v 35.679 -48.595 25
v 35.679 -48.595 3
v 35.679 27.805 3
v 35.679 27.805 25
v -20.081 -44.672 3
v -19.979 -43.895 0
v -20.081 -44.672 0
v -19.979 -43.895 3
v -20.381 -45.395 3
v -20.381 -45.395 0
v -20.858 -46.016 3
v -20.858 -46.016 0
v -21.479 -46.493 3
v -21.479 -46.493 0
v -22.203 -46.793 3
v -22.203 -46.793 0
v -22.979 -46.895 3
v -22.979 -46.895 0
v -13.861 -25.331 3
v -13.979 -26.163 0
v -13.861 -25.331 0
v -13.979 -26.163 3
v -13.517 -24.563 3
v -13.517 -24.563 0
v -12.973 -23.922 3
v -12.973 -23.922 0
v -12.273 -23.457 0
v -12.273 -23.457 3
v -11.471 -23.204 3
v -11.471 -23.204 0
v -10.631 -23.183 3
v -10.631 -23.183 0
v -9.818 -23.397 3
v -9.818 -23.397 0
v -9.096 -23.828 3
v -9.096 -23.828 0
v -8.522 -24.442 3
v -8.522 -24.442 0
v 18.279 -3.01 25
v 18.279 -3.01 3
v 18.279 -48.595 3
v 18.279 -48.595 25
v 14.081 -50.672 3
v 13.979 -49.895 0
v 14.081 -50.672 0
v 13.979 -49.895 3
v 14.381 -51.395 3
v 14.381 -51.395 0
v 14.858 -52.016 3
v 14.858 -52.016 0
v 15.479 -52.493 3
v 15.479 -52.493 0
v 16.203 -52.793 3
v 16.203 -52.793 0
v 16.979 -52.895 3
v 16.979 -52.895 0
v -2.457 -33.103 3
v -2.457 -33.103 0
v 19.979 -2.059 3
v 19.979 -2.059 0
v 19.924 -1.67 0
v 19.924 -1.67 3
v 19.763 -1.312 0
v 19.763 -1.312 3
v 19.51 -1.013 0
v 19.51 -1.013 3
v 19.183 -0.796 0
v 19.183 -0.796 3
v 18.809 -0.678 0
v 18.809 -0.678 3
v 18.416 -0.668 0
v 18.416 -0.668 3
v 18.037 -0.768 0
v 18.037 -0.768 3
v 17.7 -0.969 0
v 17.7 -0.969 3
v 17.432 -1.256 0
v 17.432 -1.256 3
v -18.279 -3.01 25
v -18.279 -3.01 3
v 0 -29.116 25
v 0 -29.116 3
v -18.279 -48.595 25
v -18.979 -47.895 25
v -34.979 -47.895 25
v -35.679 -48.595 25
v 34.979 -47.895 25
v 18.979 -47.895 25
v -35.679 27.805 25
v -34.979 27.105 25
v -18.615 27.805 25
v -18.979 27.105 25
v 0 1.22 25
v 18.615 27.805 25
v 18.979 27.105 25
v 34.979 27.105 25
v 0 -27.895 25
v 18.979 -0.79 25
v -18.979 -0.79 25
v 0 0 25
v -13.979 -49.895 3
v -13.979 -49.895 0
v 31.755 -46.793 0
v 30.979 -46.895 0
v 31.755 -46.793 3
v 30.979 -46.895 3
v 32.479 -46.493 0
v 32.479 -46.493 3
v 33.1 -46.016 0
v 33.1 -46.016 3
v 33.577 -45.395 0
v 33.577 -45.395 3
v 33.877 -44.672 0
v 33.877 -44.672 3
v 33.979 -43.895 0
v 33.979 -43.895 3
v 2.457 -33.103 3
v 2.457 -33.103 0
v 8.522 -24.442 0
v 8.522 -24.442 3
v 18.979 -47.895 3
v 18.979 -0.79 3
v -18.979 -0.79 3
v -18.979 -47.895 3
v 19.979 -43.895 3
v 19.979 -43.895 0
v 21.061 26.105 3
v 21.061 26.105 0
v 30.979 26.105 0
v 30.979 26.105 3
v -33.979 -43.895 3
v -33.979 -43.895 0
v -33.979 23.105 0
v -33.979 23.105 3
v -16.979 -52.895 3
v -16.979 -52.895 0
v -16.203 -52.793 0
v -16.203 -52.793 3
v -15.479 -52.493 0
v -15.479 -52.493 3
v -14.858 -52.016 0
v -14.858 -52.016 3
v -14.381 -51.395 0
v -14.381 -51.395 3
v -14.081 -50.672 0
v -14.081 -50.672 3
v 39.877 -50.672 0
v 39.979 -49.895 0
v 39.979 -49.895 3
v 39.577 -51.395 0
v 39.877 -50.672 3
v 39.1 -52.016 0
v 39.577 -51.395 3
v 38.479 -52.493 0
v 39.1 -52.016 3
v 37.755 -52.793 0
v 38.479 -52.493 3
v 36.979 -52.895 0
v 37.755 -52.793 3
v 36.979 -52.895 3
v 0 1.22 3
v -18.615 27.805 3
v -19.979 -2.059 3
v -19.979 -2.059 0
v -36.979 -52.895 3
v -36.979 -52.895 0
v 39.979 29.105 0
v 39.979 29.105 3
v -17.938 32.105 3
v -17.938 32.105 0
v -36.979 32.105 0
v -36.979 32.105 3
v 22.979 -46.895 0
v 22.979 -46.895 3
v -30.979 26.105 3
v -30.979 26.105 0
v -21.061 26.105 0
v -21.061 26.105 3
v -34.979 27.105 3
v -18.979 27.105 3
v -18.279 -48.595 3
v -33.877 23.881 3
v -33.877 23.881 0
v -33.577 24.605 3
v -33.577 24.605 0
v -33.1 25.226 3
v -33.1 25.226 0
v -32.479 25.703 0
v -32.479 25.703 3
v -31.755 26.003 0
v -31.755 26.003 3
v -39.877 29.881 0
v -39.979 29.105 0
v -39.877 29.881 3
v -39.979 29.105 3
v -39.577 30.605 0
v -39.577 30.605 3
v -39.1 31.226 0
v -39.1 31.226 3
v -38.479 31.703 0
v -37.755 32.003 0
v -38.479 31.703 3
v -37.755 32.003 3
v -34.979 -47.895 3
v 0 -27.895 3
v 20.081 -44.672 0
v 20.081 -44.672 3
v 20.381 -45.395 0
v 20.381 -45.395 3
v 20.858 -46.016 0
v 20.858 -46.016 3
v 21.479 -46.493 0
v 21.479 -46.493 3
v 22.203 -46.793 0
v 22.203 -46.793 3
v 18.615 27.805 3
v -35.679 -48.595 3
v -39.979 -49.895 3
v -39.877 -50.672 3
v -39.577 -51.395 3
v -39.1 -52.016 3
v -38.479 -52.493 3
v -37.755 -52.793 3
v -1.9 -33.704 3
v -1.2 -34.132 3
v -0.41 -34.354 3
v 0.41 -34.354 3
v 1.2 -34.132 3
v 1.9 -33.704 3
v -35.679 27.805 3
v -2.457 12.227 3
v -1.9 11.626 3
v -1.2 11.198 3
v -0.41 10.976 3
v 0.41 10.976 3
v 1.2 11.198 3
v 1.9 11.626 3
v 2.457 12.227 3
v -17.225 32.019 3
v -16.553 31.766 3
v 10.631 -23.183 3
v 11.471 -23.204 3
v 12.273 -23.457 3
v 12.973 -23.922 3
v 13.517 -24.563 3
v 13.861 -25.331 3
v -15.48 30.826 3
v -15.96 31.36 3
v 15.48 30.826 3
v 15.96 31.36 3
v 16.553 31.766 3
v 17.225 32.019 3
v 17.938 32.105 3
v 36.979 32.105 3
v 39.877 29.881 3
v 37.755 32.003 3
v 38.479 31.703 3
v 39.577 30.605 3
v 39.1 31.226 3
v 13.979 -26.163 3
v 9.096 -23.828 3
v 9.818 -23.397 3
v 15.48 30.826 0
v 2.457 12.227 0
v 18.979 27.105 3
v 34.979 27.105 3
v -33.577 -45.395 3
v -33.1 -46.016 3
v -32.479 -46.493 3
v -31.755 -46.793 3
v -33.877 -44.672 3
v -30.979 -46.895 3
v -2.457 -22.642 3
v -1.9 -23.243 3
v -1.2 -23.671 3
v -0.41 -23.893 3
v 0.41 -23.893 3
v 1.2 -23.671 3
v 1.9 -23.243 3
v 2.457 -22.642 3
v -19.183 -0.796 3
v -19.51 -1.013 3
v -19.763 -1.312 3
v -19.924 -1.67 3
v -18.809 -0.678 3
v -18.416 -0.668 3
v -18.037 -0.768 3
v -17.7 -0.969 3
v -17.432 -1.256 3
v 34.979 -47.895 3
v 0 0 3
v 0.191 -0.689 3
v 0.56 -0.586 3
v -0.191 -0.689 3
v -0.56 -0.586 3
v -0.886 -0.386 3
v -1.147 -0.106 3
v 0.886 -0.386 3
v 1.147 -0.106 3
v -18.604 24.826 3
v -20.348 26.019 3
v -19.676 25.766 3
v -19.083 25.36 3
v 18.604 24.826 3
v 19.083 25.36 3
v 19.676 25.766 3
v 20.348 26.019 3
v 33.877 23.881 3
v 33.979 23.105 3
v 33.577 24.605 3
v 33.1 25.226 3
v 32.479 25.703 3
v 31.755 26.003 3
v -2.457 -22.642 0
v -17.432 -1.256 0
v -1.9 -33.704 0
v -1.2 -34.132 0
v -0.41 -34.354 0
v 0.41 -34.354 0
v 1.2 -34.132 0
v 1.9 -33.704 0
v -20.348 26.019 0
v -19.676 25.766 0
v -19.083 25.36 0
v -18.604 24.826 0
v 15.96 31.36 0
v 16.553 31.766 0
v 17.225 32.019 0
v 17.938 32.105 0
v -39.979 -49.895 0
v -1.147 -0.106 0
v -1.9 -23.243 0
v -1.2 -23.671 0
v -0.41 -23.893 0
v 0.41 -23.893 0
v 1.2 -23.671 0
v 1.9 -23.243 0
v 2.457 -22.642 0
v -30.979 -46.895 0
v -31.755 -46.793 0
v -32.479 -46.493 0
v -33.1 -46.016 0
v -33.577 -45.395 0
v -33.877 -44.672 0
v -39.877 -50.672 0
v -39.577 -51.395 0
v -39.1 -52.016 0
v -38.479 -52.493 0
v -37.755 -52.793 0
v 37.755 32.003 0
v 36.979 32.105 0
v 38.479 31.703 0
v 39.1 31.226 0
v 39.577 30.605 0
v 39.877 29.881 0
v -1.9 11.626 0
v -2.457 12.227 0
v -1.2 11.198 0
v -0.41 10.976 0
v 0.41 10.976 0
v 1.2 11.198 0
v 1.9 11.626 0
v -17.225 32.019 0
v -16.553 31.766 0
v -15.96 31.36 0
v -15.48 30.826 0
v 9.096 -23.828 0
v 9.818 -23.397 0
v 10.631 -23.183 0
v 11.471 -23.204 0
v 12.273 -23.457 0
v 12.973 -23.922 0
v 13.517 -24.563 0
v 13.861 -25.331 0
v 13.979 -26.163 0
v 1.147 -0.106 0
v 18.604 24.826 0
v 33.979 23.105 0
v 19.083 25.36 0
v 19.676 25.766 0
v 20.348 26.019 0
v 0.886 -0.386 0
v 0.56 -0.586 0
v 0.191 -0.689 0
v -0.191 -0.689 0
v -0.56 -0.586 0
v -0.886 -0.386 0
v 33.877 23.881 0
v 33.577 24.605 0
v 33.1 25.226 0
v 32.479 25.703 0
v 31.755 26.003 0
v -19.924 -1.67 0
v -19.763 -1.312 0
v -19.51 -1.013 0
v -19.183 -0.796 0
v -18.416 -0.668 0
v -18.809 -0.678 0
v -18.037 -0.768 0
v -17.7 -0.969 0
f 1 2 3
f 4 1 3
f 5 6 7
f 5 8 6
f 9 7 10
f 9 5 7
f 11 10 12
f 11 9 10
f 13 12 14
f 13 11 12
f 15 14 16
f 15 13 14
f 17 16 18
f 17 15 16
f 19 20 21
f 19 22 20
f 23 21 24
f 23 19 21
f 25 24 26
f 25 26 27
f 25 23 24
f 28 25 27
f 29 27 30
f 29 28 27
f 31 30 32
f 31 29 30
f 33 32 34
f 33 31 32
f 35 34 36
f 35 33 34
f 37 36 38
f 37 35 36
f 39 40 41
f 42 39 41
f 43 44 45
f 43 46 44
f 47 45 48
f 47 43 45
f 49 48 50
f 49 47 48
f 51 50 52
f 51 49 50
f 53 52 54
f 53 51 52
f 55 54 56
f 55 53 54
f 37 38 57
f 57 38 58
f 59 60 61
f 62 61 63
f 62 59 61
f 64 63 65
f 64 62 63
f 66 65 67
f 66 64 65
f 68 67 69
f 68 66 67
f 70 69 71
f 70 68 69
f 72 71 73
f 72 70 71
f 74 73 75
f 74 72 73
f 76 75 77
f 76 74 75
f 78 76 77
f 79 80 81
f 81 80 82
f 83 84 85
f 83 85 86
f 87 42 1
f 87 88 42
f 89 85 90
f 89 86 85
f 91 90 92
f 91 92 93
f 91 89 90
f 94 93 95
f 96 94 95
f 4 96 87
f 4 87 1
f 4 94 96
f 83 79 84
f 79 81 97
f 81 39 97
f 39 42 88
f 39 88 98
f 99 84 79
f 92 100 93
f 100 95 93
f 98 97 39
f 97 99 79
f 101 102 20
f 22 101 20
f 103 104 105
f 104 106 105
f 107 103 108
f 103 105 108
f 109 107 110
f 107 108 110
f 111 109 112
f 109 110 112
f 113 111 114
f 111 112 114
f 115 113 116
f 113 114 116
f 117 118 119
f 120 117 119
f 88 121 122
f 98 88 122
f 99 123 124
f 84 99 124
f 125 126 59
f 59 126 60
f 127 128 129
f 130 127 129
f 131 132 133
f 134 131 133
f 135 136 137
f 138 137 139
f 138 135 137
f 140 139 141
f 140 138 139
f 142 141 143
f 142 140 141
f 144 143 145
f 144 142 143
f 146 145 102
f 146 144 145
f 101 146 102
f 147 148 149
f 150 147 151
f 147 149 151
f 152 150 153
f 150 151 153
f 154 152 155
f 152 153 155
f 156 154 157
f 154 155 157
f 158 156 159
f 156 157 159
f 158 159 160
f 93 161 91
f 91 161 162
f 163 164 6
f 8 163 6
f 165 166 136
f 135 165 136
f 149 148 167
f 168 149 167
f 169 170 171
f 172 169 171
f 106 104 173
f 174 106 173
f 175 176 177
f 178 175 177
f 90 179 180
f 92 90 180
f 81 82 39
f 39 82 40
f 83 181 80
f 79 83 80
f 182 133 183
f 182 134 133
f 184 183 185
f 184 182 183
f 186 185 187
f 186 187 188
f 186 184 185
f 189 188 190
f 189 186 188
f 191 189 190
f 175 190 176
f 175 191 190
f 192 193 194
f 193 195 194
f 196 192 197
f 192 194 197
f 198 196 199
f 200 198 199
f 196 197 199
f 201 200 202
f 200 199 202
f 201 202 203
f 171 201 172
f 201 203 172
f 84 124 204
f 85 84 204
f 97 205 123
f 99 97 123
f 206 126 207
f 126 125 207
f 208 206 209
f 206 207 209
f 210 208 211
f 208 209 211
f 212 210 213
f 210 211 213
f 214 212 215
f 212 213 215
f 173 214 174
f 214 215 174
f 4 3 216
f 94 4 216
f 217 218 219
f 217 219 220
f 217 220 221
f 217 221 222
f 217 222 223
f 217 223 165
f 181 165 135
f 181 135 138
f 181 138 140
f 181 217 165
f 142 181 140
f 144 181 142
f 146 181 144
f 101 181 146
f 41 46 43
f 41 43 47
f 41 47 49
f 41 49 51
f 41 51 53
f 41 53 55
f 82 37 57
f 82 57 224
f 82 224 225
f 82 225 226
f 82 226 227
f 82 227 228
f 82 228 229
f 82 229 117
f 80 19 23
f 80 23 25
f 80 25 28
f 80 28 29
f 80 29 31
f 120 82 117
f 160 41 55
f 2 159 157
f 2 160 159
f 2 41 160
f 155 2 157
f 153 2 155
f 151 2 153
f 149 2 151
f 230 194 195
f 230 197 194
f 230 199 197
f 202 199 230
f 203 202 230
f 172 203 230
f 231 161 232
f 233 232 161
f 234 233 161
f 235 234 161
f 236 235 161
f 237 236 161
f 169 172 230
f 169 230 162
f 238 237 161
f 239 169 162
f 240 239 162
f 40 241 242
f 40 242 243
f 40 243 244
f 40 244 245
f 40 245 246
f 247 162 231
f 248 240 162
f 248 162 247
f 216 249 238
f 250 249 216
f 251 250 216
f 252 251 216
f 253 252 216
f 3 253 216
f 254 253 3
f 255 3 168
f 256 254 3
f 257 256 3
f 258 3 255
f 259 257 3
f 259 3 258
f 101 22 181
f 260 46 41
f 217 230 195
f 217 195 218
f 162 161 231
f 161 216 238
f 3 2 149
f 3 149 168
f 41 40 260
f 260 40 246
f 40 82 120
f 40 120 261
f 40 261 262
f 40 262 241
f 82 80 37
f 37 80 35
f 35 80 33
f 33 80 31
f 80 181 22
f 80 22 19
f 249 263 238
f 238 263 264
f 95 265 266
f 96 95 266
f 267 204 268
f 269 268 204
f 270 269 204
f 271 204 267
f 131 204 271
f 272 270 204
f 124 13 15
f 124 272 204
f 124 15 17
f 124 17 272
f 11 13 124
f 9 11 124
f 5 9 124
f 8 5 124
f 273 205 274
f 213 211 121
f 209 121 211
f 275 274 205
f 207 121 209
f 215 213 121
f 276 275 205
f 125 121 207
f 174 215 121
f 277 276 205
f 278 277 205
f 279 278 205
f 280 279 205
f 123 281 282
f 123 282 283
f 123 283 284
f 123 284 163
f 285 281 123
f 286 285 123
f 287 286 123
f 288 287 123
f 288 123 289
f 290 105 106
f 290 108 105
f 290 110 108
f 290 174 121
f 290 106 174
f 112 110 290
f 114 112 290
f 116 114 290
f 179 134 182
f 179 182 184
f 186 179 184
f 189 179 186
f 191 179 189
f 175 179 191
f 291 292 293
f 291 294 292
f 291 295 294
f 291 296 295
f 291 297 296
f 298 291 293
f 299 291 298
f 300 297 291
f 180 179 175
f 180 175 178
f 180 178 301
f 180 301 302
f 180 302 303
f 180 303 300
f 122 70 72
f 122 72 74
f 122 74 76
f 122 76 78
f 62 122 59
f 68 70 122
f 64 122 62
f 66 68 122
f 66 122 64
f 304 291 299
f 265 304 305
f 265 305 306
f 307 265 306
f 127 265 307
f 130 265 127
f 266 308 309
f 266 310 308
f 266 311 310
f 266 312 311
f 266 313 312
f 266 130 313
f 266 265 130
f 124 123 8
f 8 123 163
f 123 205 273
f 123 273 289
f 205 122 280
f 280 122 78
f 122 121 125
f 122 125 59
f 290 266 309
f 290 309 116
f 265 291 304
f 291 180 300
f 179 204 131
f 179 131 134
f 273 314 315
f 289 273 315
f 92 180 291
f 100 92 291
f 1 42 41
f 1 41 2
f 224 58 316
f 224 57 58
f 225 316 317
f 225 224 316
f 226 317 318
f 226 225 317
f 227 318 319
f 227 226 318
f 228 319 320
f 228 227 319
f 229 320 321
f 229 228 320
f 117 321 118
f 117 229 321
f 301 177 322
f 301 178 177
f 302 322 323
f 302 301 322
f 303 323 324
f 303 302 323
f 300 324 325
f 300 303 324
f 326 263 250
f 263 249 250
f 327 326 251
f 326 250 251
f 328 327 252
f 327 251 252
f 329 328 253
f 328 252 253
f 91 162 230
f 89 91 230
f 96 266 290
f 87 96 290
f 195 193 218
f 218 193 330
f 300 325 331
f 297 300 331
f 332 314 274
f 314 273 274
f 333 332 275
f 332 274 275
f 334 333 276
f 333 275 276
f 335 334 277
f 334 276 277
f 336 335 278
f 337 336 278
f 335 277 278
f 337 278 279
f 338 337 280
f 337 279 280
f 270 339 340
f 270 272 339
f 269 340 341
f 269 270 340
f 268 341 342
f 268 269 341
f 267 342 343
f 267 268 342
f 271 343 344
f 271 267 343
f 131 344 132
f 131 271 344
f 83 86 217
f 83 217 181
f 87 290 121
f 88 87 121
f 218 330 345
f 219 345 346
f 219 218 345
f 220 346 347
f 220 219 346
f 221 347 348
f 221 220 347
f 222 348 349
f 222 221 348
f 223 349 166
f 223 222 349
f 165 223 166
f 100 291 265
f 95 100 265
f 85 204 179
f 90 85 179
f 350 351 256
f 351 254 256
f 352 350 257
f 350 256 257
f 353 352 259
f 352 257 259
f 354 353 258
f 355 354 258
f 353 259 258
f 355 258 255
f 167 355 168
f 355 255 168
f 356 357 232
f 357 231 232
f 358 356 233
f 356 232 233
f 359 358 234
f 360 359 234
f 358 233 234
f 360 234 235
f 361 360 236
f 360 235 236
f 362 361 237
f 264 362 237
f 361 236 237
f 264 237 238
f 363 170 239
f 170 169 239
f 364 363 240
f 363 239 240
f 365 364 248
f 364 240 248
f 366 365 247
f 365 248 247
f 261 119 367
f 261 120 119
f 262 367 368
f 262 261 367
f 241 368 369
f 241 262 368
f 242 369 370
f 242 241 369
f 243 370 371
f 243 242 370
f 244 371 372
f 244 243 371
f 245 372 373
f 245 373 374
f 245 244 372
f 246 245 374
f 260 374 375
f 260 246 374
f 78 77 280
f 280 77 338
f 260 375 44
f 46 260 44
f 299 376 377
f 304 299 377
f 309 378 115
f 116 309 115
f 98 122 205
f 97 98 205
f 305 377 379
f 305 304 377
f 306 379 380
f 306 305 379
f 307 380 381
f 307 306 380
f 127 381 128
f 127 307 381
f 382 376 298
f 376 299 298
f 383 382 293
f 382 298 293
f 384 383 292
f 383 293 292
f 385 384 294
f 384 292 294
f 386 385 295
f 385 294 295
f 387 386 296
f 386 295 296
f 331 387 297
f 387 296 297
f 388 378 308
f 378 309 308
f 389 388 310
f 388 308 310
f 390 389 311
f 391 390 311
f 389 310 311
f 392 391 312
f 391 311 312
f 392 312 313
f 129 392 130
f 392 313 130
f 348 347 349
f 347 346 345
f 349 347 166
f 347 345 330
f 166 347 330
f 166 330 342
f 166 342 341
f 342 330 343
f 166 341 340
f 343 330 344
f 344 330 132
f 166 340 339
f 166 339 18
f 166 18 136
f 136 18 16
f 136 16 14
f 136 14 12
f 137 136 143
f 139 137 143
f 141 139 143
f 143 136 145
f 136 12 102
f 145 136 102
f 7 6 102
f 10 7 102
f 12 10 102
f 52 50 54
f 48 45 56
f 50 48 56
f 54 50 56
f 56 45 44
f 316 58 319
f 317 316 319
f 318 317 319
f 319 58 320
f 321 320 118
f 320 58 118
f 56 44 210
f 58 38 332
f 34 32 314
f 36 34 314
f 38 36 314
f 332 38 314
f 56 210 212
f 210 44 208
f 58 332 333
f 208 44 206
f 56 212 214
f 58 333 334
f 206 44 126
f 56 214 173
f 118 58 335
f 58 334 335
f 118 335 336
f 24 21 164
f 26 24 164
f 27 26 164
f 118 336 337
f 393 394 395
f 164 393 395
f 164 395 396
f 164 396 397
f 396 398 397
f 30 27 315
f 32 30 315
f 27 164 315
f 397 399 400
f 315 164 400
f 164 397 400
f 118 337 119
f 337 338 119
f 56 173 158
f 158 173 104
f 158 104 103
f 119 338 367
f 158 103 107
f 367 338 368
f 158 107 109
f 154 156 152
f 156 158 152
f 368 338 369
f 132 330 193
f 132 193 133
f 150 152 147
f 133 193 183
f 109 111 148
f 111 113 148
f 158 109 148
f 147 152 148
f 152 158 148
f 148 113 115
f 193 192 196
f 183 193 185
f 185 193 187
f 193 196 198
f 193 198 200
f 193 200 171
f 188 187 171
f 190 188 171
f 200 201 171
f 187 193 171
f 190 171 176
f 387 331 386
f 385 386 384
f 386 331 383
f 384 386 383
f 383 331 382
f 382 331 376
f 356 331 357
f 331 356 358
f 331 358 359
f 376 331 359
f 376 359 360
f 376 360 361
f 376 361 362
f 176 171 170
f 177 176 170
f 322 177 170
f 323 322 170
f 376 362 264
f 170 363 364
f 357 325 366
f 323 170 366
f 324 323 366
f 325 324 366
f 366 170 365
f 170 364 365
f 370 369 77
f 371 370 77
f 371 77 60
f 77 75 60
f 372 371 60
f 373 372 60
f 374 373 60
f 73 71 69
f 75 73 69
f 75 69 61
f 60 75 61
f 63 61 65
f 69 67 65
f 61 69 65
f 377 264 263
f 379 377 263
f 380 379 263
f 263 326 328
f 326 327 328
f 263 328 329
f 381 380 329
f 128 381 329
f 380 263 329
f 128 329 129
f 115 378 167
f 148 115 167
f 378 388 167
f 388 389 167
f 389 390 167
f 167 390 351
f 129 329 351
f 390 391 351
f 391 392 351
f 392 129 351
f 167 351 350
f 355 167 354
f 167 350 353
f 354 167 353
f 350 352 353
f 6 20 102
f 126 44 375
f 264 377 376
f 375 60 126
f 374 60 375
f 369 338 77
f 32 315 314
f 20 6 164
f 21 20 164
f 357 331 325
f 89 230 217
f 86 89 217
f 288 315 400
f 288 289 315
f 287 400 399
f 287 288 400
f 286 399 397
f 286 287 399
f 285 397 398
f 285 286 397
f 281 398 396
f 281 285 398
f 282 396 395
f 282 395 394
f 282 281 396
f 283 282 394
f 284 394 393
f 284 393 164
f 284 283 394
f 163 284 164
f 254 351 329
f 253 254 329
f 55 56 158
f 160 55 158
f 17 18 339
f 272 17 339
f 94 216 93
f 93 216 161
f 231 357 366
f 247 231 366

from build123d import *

# Parameters (mm, degrees)
F1_DEPTH = 3
F2_DEPTH = 25
F3_R     = 3
F4_R     = 1.4


with BuildPart() as f1:
    # F0 (on Top) → F1 (new body)
    with BuildSketch(Plane.XY):
        Polygon((-39.9790219963, 32.104852085), (-39.9790219963, -52.8951495448), (-13.9790203664, -52.8951495448), (-13.9790203664, -16.6482740563), (0, -36.6123841288), (13.9790203664, -16.6482740563), (13.9790203664, -52.8951495448), (39.9790219963, -52.8951495448), (39.9790219963, 32.104852085), (16.3761855044, 32.104852085), (0, 8.7172353989), (-16.3761855044, 32.104852085), align=None)
        Polygon((-18.2790211814, -48.5951487299), (-35.6790211814, -48.5951487299), (-35.6790211814, 27.8048512701), (-18.614624246, 27.8048512701), (0, 1.2204127569), (18.614624246, 27.8048512701), (35.6790211814, 27.8048512701), (35.6790211814, -48.5951487299), (18.2790211814, -48.5951487299), (18.2790211814, -3.0104138215), (0, -29.1155614869), (-18.2790211814, -3.0104138215), align=None, mode=Mode.SUBTRACT)
        Polygon((-35.6790211814, 27.8048512701), (-35.6790211814, -48.5951487299), (-18.2790211814, -48.5951487299), (-18.2790211814, -3.0104138215), (0, -29.1155614869), (18.2790211814, -3.0104138215), (18.2790211814, -48.5951487299), (35.6790211814, -48.5951487299), (35.6790211814, 27.8048512701), (18.614624246, 27.8048512701), (0, 1.2204127569), (-18.614624246, 27.8048512701), align=None)
        Polygon((-18.9790211814, -47.8951487299), (-34.9790211814, -47.8951487299), (-34.9790211814, 27.1048512701), (-18.9790211814, 27.1048512701), (0, 0), (18.9790211814, 27.1048512701), (34.9790211814, 27.1048512701), (34.9790211814, -47.8951487299), (18.9790211814, -47.8951487299), (18.9790211814, -0.7902974599), (0, -27.8951487299), (-18.9790211814, -0.7902974599), align=None, mode=Mode.SUBTRACT)
        Polygon((-34.9790211814, 27.1048512701), (-34.9790211814, -47.8951487299), (-18.9790211814, -47.8951487299), (-18.9790211814, -0.7902974599), (0, -27.8951487299), (18.9790211814, -0.7902974599), (18.9790211814, -47.8951487299), (34.9790211814, -47.8951487299), (34.9790211814, 27.1048512701), (18.9790211814, 27.1048512701), (0, 0), (-18.9790211814, 27.1048512701), align=None)
        Polygon((-19.9790211814, -46.8951487299), (-33.9790211814, -46.8951487299), (-33.9790211814, 26.1048512701), (-19.4995882319, 26.1048512701), (0, -1.7434467956), (19.4995882319, 26.1048512701), (33.9790211814, 26.1048512701), (33.9790211814, -46.8951487299), (19.9790211814, -46.8951487299), (19.9790211814, 2.3812973425), (0, -26.1517019343), (-19.9790211814, 2.3812973425), align=None, mode=Mode.SUBTRACT)
    extrude(amount=F1_DEPTH)

    # F0 (on Top) → F2 (join)
    with BuildSketch(Plane.XY):
        Polygon((-35.6790211814, 27.8048512701), (-35.6790211814, -48.5951487299), (-18.2790211814, -48.5951487299), (-18.2790211814, -3.0104138215), (0, -29.1155614869), (18.2790211814, -3.0104138215), (18.2790211814, -48.5951487299), (35.6790211814, -48.5951487299), (35.6790211814, 27.8048512701), (18.614624246, 27.8048512701), (0, 1.2204127569), (-18.614624246, 27.8048512701), align=None)
        Polygon((-18.9790211814, -47.8951487299), (-34.9790211814, -47.8951487299), (-34.9790211814, 27.1048512701), (-18.9790211814, 27.1048512701), (0, 0), (18.9790211814, 27.1048512701), (34.9790211814, 27.1048512701), (34.9790211814, -47.8951487299), (18.9790211814, -47.8951487299), (18.9790211814, -0.7902974599), (0, -27.8951487299), (-18.9790211814, -0.7902974599), align=None, mode=Mode.SUBTRACT)
    extrude(amount=F2_DEPTH)

    # F3
    f3_edges = [f1.edges().sort_by_distance(p)[0] for p in [
        (19.499588, 26.104851, 1.5),
        (33.979021, 26.104851, 1.5),
        (-33.979021, -46.895149, 1.5),
        (-19.979021, -46.895149, 1.5),
        (-39.979022, -52.89515, 1.5),
        (-13.97902, -52.89515, 1.5),
        (13.97902, -52.89515, 1.5),
        (39.979022, -52.89515, 1.5),
        (39.979022, 32.104852, 1.5),
        (16.376186, 32.104852, 1.5),
        (-16.376186, 32.104852, 1.5),
        (0, 8.717235, 1.5),
        (-39.979022, 32.104852, 1.5),
        (0, -36.612384, 1.5),
        (-13.97902, -16.648274, 1.5),
        (13.97902, -16.648274, 1.5),
        (0, -26.151702, 1.5),
        (-19.499588, 26.104851, 1.5),
        (-33.979021, 26.104851, 1.5),
        (33.979021, -46.895149, 1.5),
        (19.979021, -46.895149, 1.5),
    ]]
    fillet(f3_edges, radius=F3_R)

    # F4
    f4_edges = [f1.edges().sort_by_distance(p)[0] for p in [
        (-19.979021, 2.381297, 1.5),
        (19.979021, 2.381297, 1.5),
        (0, -1.743447, 1.5),
    ]]
    fillet(f4_edges, radius=F4_R)


solid = f1.part
